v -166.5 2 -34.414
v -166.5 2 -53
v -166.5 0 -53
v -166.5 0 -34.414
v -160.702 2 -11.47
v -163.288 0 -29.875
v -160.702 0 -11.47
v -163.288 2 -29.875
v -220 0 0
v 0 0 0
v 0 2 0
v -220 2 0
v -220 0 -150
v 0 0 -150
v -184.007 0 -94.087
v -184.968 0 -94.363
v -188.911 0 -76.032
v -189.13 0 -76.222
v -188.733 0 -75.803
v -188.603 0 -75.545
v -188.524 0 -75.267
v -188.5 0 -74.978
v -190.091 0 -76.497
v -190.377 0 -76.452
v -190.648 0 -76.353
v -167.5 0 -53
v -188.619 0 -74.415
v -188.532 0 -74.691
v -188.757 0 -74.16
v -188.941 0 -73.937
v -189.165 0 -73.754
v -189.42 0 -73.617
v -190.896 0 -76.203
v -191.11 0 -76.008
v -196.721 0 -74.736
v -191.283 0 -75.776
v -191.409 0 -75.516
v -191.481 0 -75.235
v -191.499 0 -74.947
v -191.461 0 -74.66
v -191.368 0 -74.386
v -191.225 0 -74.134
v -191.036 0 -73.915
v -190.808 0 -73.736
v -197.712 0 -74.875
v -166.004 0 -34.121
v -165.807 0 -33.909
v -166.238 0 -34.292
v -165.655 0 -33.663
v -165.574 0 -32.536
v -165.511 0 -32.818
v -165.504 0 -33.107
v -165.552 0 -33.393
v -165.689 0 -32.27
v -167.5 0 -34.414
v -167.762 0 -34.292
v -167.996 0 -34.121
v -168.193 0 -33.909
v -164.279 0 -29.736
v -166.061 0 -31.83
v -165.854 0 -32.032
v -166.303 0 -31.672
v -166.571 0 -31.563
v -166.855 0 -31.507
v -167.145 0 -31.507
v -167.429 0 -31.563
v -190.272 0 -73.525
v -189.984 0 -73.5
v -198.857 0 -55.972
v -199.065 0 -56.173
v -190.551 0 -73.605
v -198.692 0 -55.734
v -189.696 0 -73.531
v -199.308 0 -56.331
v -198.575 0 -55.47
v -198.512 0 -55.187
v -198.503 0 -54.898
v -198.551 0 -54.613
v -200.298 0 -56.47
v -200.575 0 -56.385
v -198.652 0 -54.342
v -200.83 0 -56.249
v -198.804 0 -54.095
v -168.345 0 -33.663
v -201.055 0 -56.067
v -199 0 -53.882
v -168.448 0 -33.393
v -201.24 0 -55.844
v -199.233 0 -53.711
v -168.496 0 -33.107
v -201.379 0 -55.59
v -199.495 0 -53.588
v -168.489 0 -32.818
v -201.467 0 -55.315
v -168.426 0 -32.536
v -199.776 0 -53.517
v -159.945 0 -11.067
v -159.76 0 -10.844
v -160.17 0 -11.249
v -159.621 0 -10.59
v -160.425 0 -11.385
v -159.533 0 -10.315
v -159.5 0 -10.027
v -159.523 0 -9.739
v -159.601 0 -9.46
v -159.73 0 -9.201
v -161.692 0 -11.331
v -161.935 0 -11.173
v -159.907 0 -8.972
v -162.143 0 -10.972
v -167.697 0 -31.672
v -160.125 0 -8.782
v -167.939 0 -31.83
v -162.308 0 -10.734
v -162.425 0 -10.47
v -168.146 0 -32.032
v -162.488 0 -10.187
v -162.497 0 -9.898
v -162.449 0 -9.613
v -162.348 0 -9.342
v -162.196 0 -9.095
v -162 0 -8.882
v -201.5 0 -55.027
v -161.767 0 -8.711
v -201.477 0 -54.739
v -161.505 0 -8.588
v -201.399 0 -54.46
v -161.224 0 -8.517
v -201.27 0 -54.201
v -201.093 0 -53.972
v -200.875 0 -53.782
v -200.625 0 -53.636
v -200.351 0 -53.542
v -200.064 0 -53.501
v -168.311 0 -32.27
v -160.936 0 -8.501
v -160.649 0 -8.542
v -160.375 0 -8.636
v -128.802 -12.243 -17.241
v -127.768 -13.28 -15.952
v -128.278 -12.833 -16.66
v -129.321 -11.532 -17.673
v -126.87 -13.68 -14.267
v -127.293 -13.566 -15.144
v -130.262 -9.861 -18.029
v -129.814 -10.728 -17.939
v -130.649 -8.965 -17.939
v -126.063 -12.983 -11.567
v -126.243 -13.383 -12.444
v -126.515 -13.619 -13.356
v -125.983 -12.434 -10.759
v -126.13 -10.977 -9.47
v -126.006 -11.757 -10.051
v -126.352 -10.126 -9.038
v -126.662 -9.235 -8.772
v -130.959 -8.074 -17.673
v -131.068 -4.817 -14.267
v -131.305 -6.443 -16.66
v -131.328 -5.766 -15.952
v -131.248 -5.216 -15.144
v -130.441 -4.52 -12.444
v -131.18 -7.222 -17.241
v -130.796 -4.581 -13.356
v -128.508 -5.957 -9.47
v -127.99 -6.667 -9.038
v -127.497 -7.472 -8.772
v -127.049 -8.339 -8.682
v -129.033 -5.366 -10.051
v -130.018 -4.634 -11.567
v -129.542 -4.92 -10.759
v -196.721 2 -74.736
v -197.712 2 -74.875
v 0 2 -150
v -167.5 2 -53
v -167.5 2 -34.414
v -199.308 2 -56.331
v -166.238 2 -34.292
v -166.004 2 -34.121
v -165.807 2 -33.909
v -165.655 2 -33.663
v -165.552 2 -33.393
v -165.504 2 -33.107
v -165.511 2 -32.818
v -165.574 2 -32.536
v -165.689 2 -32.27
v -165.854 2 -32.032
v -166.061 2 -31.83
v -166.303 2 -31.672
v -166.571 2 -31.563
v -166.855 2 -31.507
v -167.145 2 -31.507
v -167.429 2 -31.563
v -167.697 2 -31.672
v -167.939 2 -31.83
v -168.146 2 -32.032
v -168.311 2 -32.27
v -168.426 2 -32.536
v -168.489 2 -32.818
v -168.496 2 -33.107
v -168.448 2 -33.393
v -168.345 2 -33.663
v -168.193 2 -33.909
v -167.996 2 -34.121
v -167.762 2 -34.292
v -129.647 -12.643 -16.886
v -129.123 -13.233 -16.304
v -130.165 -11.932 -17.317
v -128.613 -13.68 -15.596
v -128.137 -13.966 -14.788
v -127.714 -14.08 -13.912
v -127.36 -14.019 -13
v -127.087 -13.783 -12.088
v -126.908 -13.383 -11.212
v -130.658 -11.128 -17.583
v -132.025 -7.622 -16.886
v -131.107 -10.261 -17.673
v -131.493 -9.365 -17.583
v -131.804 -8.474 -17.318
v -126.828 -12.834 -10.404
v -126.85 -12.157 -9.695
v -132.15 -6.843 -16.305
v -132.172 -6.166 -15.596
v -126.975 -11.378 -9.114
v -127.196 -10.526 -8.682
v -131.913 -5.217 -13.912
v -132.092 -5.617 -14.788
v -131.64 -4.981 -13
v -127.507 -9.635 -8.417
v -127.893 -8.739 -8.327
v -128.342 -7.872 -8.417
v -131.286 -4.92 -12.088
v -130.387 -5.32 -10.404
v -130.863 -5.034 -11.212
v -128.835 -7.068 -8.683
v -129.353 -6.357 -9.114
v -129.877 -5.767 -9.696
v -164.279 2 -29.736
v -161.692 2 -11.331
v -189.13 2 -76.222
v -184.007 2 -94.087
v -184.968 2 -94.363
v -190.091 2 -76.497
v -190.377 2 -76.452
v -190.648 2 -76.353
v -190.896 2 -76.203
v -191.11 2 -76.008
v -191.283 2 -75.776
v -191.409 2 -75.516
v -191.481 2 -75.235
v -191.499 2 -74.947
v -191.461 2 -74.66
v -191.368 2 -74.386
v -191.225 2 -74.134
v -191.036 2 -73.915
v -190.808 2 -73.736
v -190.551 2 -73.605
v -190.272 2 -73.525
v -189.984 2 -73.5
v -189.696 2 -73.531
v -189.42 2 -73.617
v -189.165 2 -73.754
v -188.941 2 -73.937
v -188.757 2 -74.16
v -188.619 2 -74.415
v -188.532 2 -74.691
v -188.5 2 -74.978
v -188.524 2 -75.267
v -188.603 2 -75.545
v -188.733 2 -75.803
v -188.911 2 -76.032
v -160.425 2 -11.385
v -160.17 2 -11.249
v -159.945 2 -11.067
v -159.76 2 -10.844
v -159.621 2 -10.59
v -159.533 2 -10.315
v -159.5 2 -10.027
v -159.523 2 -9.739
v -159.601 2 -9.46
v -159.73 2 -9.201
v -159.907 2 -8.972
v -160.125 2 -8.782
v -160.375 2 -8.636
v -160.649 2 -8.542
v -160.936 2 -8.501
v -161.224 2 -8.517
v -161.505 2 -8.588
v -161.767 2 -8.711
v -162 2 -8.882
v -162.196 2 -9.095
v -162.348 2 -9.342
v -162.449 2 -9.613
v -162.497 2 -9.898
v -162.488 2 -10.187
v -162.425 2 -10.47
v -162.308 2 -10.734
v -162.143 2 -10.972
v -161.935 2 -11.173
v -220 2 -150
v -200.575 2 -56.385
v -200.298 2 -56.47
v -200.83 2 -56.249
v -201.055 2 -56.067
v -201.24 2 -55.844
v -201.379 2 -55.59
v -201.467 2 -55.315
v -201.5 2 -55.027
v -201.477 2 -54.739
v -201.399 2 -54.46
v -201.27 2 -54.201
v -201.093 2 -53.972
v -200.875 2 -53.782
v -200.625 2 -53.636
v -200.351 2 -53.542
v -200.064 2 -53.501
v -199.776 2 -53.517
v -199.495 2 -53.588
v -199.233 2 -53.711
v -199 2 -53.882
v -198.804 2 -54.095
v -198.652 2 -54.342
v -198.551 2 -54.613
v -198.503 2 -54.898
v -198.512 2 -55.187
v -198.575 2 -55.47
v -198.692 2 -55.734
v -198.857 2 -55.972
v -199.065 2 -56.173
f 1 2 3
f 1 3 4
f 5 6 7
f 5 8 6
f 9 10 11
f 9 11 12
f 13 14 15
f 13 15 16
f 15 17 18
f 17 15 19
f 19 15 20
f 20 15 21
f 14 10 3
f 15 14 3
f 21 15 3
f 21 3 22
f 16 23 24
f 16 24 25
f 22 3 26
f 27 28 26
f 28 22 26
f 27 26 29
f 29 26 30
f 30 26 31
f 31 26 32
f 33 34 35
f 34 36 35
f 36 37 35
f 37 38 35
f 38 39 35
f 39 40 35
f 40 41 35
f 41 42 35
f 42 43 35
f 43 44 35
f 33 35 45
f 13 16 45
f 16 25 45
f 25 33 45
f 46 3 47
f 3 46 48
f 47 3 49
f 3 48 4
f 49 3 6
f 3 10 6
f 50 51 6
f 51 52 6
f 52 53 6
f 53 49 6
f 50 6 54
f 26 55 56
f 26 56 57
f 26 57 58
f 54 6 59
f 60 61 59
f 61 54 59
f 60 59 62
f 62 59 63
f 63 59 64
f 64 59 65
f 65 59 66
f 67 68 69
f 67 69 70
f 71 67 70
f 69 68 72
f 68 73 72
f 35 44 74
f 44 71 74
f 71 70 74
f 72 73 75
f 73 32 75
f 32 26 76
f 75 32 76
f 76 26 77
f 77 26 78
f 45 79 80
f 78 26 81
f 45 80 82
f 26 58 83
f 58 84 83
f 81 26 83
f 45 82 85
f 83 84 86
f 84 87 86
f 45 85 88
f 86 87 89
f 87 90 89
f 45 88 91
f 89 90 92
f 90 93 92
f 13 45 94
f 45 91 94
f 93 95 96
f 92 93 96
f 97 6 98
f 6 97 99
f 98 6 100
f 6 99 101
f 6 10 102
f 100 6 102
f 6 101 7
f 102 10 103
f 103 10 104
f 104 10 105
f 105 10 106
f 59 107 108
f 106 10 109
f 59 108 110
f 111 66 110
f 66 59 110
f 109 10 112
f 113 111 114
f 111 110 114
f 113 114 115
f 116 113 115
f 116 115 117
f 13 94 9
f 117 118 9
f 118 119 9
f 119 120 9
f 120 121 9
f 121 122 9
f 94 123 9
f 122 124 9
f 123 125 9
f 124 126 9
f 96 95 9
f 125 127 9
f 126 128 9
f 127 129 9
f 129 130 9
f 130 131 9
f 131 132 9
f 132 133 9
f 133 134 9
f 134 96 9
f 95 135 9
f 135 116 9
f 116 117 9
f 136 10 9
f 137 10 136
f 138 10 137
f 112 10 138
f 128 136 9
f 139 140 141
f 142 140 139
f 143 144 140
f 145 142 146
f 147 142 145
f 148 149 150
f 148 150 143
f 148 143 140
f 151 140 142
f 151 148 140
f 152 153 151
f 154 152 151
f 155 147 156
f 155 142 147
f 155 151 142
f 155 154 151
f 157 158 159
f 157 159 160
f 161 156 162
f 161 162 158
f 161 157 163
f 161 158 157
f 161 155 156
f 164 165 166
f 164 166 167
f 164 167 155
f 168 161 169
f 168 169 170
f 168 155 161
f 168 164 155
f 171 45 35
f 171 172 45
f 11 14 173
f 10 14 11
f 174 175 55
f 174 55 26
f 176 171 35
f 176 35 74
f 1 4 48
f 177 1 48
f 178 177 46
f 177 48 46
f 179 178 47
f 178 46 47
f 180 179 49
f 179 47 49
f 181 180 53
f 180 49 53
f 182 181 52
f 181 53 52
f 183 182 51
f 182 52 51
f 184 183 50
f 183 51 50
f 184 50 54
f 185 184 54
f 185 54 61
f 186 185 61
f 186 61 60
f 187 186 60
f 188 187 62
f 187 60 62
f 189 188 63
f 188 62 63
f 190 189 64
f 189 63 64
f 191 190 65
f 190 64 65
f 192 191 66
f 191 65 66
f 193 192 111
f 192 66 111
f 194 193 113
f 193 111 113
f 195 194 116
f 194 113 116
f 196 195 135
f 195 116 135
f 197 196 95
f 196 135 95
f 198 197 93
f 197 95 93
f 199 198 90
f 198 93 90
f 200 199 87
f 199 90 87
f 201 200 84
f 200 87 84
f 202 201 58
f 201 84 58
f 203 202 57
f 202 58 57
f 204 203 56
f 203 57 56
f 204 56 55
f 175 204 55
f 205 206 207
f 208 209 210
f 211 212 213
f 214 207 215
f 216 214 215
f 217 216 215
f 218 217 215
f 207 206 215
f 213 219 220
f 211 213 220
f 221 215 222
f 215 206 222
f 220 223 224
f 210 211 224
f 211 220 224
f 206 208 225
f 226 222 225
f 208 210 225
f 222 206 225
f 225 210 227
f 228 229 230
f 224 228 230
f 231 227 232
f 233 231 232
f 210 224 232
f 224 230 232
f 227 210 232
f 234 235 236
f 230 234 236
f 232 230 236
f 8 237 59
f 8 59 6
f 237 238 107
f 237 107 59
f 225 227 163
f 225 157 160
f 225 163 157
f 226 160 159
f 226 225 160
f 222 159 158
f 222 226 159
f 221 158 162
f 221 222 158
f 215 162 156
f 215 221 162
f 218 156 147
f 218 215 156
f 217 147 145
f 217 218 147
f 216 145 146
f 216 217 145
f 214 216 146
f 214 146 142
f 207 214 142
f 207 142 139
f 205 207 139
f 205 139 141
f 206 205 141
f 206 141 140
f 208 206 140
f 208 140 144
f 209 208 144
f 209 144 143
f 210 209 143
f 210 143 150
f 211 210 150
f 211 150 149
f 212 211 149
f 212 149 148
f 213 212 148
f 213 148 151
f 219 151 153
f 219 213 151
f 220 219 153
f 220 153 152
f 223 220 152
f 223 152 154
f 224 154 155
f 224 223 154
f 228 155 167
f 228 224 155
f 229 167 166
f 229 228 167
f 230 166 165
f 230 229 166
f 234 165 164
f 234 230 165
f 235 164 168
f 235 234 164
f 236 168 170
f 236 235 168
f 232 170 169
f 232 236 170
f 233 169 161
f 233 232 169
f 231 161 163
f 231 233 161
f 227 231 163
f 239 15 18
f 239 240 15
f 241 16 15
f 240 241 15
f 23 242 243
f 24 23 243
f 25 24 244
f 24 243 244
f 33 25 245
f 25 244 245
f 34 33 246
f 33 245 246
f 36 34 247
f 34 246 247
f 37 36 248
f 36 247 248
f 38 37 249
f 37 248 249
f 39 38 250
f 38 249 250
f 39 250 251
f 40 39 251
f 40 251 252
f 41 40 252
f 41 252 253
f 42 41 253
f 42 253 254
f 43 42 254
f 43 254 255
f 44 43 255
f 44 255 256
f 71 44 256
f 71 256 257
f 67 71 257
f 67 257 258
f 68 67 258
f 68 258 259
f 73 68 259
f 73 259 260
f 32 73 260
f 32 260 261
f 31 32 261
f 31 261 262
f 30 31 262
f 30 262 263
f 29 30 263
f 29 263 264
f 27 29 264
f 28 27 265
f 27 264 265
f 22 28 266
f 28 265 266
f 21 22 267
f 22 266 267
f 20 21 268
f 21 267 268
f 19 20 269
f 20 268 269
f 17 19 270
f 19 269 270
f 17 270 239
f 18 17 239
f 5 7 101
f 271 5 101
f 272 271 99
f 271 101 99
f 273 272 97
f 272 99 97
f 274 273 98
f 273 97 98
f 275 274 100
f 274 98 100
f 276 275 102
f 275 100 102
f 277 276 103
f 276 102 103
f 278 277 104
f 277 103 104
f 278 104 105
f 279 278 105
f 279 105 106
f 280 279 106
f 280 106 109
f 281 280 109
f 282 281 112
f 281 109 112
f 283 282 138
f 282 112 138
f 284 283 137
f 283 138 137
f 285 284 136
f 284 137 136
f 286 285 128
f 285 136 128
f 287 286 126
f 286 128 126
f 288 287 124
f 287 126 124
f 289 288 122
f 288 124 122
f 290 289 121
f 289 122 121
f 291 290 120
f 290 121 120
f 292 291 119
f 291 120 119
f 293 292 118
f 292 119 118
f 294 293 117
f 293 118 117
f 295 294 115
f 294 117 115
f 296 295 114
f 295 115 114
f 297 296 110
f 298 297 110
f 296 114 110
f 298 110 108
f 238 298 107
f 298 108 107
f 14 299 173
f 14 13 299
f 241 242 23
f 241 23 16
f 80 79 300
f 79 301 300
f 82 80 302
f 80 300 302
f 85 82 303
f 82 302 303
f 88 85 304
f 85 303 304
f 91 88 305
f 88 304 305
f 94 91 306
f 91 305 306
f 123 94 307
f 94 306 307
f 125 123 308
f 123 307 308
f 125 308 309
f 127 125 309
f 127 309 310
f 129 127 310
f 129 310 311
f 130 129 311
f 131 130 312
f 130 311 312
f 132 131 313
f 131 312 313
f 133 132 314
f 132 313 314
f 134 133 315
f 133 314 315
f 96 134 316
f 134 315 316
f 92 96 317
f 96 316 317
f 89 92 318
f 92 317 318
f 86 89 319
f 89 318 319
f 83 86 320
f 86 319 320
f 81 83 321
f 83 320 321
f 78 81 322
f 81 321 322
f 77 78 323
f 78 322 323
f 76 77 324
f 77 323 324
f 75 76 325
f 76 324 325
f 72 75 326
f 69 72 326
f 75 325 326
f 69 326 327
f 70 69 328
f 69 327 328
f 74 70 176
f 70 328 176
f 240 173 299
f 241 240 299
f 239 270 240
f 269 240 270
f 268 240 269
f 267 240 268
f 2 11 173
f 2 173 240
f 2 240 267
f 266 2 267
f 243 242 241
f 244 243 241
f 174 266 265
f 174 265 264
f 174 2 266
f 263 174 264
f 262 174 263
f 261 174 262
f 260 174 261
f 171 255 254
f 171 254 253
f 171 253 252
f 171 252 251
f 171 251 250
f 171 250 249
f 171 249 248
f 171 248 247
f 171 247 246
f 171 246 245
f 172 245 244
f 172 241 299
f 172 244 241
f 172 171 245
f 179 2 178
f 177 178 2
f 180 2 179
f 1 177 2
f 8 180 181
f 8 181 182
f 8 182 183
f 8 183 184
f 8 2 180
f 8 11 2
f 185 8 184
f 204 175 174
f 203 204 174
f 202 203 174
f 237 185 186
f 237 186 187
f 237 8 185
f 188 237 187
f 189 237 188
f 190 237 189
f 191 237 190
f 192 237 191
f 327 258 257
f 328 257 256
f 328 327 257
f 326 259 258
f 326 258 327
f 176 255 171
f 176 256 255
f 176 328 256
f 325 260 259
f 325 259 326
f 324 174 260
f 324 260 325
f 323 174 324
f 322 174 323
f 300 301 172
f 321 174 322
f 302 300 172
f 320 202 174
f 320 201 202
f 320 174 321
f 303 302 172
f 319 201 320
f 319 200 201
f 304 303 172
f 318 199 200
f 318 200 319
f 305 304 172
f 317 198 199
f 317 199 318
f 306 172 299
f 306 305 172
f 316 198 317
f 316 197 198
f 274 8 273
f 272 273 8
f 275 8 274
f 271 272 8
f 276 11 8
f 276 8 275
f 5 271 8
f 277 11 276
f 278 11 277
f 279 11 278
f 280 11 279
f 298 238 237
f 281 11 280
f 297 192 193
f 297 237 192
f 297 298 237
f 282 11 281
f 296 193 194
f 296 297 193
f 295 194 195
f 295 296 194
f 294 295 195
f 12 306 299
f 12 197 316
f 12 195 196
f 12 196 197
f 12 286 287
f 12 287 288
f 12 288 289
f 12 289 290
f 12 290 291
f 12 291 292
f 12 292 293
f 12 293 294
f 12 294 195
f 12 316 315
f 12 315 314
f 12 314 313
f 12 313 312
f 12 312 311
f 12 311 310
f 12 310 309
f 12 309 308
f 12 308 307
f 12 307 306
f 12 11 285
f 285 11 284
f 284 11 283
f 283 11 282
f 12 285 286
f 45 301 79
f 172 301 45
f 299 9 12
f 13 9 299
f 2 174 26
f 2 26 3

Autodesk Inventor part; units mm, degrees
ref_plane "YZ Plane" through (0, 0, 0) normal (1, 0, 0) x (0, 1, 0)
ref_plane "XZ Plane" through (0, 0, 0) normal (0, 1, 0) x (-1, 0, 0)
sketch "Sketch2" plane through (0, 0, 0) normal (0, 1, 0) x (-1, 0, 0)
  line L0 (0, 0) -> (220, 0)
  line L1 (220, 0) -> (220, -150)
  line L2 (220, -150) -> (0, -150)
  line L3 (0, -150) -> (0, 0)
  dimension "d0" = 150
  dimension "d1" = 220
extrude "Plate" add sketch "Sketch2" along normal blind 2
sketch "Sketch3" plane through (0, 2, 0) normal (0, 1, 0) x (1, 0, 0)
  point P0 (0, 0)
  point P1 (-161, 10)
  dimension "d4" = 161
  dimension "d5" = 10
hole "Finger 2 position" at (-161, 2, -10) direction (0, -1, 0) diameter 3 end through all
sketch "Sketch4" plane through (0, 2, 0) normal (0, 1, 0) x (1, 0, 0)
  circle A0 centre (-161, 10) radius 1.5 projected
  line L0 (-161, 10) -> (-164.1646, 32.5171) construction
  line L1 (-161, 10) -> (-161, 35.4885) construction
  line L2 (-161.4951, 9.9304) -> (-161, 10)
  line L3 (-161, 10) -> (-160.5049, 10.0696)
  line L4 (-161.4951, 9.9304) -> (-164.2786, 29.7358)
  line L5 (-164.2786, 29.7358) -> (-163.2883, 29.8749)
  line L6 (-163.2883, 29.8749) -> (-160.5049, 10.0696)
  point P0 (0, 0)
  dimension "d14" = 1
  dimension "d15" = 20
  dimension "d32" = 8
extrude "Finger 2 angle" cut sketch "Sketch4" against normal through all contours L6 L3 L2 L4 A0 | A0 L4 L5 L6 picked at (-161.3957, 10.4204)
sketch "Sketch5" plane through (0, 2, 0) normal (0, 1, 0) x (1, 0, 0)
  point P0 (0, 0)
  point P1 (-167, 33)
  dimension "d18" = 33
  dimension "d19" = 167
hole "Finger 3 position" at (-167, 2, -33) direction (0, -1, 0) diameter 3 end through all
sketch "Sketch6" plane through (0, 2, 0) normal (0, 1, 0) x (1, 0, 0)
  circle A0 centre (-167, 33) radius 1.5 projected
  line L0 (-167, 33) -> (-167, 67.5) construction
  line L1 (-167, 33) -> (-167, 65.8824) construction
  line L2 (-167.5, 33) -> (-167, 33)
  line L3 (-167, 33) -> (-166.5, 33)
  line L4 (-167.5, 33) -> (-167.5, 53)
  line L5 (-167.5, 53) -> (-166.5, 53)
  line L6 (-166.5, 53) -> (-166.5, 33)
  point P0 (0, 0)
  dimension "d27" = 0
  dimension "d28" = 1
  dimension "d29" = 20
extrude "Finger 3 angle" cut sketch "Sketch6" against normal through all contours L6 L3 L2 L4 A0 | A0 L4 L5 L6 picked at (-167.3333, 33.4714)
sketch3d "Thumb joint geometry"
ref_plane "Work Plane1" through (-129.5, -9.5, -13) normal (0.8447, 0.4001, -0.3556) x (-0.4281, 0.9037, 0)
sketch "Sketch7" plane through (-129.5, -9.5, -13) normal (0.8447, 0.4001, -0.3556) x (-0.4281, 0.9037, 0)
  circle A0 centre (0, 0) radius 5
  point P0 (-46.8517, 55.2188)
  dimension "d39" = 10
extrude "Thumb joint" add sketch "Sketch7" along normal blind 1
sketch "Sketch9" plane through (0, 2, 0) normal (0, 1, 0) x (1, 0, 0)
  circle A0 centre (-200, 55) radius 1.5
  line L0 (-196.7214, 74.7358) -> (-199.5049, 54.9304)
  line L1 (-199.5049, 54.9304) -> (-200.4951, 55.0696)
  line L2 (-200.4951, 55.0696) -> (-197.7117, 74.8749)
  line L3 (-197.7117, 74.8749) -> (-196.7214, 74.7358)
  line L4 (-196.7214, 74.7358) -> (-200.4951, 55.0696) construction
  line L5 (-199.5049, 54.9304) -> (-197.7117, 74.8749) construction
  line L6 (-200, 55) -> (-92.8888, 55) construction
  point P0 (0, 0)
  point P1 (-198.6083, 64.9027)
  dimension "d42" = 20
  dimension "d43" = 3
  dimension "d44" = 200
  dimension "d45" = 55
  dimension "d47" = 82
  dimension "d48" = 1
extrude "Finger 3" cut sketch "Sketch9" against normal through all
sketch "Sketch10" plane through (0, 2, 0) normal (0, 1, 0) x (1, 0, 0)
  circle A0 centre (-190, 75) radius 1.5
  line L0 (-184.0066, 94.0874) -> (-189.5194, 74.8622)
  line L1 (-189.5194, 74.8622) -> (-190.4806, 75.1378)
  line L2 (-190.4806, 75.1378) -> (-184.9679, 94.3631)
  line L3 (-184.9679, 94.3631) -> (-184.0066, 94.0874)
  line L4 (-184.0066, 94.0874) -> (-190.4806, 75.1378) construction
  line L5 (-189.5194, 74.8622) -> (-184.9679, 94.3631) construction
  line L6 (-190, 75) -> (-75.9657, 75) construction
  point P0 (0, 0)
  point P1 (-187.2436, 84.6126)
  dimension "d51" = 3
  dimension "d52" = 1
  dimension "d53" = 20
  dimension "d54" = 190
  dimension "d55" = 75
  dimension "d56" = 74
extrude "Finger 4" cut sketch "Sketch10" against normal through all
equation "\"d4\" = finger_2_z"
equation "\"d5\" = finger_2_x"
equation "\"d32\" = finger_2_angle"
equation "\"d18\" = finger_3_x"
equation "\"d19\" = finger_3_z"
equation "\"d33\" = thumb_CMC_x"
equation "\"d34\" = thumb_CMC_z"
equation "\"d35\" = thumb_CMC_y"
equation "\"d36\" = thumb_CMC_axis_z"
equation "\"d37\" = -thumb_CMC_axis_x"
equation "\"d38\" = thumb_CMC_axis_y"
equation "\"d44\" = finger_4_x"
equation "\"d45\" = finger_4_z"
equation "\"d54\" = finger_5_x"
equation "\"d55\" = finger_5_z"
equation "\"thumb_CMC_axis_x\" = thumb_axis_x"
equation "\"thumb_CMC_axis_y\" = thumb_axis_y"
equation "\"thumb_CMC_axis_z\" = thumb_axis_z"
equation "\"thumb_CMC_x\" = thumb_x"
equation "\"thumb_CMC_y\" = thumb_y"
equation "\"finger_2_x\" = F2_x"
equation "\"finger_2_z\" = F2_z"
equation "\"finger_2_angle\" = F2_angle"
equation "\"finger_3_x\" = F3_x"
equation "\"finger_3_z\" = F3_z"
equation "\"finger_4_x\" = F4_x"
equation "\"finger_4_z\" = F4_z"
equation "\"finger_4_angle\" = F4_angle"
equation "\"finger_5_x\" = F5_x"
equation "\"finger_5_z\" = F5_z"
equation "\"finger_5_angle\" = F5_angle"
equation "\"thumb_CMC_z\" = 120"
equation "\"thumb_axis_x\" = -0.4"
equation "\"thumb_axis_y\" = 0.45"
equation "\"thumb_axis_z\" = 0.95"
equation "\"thumb_x\" = 17"
equation "\"thumb_y\" = 5"
equation "\"F2_x\" = 10"
equation "\"F2_z\" = 161"
equation "\"F2_angle\" = 8deg"
equation "\"F3_x\" = 33"
equation "\"F3_z\" = 167"
equation "\"F4_x\" = 200"
equation "\"F4_z\" = 55"
equation "\"F4_angle\" = -8deg"
equation "\"F5_x\" = 190"
equation "\"F5_z\" = 75"
equation "\"F5_angle\" = -16deg"
properties part number "metacarpus geometry"
